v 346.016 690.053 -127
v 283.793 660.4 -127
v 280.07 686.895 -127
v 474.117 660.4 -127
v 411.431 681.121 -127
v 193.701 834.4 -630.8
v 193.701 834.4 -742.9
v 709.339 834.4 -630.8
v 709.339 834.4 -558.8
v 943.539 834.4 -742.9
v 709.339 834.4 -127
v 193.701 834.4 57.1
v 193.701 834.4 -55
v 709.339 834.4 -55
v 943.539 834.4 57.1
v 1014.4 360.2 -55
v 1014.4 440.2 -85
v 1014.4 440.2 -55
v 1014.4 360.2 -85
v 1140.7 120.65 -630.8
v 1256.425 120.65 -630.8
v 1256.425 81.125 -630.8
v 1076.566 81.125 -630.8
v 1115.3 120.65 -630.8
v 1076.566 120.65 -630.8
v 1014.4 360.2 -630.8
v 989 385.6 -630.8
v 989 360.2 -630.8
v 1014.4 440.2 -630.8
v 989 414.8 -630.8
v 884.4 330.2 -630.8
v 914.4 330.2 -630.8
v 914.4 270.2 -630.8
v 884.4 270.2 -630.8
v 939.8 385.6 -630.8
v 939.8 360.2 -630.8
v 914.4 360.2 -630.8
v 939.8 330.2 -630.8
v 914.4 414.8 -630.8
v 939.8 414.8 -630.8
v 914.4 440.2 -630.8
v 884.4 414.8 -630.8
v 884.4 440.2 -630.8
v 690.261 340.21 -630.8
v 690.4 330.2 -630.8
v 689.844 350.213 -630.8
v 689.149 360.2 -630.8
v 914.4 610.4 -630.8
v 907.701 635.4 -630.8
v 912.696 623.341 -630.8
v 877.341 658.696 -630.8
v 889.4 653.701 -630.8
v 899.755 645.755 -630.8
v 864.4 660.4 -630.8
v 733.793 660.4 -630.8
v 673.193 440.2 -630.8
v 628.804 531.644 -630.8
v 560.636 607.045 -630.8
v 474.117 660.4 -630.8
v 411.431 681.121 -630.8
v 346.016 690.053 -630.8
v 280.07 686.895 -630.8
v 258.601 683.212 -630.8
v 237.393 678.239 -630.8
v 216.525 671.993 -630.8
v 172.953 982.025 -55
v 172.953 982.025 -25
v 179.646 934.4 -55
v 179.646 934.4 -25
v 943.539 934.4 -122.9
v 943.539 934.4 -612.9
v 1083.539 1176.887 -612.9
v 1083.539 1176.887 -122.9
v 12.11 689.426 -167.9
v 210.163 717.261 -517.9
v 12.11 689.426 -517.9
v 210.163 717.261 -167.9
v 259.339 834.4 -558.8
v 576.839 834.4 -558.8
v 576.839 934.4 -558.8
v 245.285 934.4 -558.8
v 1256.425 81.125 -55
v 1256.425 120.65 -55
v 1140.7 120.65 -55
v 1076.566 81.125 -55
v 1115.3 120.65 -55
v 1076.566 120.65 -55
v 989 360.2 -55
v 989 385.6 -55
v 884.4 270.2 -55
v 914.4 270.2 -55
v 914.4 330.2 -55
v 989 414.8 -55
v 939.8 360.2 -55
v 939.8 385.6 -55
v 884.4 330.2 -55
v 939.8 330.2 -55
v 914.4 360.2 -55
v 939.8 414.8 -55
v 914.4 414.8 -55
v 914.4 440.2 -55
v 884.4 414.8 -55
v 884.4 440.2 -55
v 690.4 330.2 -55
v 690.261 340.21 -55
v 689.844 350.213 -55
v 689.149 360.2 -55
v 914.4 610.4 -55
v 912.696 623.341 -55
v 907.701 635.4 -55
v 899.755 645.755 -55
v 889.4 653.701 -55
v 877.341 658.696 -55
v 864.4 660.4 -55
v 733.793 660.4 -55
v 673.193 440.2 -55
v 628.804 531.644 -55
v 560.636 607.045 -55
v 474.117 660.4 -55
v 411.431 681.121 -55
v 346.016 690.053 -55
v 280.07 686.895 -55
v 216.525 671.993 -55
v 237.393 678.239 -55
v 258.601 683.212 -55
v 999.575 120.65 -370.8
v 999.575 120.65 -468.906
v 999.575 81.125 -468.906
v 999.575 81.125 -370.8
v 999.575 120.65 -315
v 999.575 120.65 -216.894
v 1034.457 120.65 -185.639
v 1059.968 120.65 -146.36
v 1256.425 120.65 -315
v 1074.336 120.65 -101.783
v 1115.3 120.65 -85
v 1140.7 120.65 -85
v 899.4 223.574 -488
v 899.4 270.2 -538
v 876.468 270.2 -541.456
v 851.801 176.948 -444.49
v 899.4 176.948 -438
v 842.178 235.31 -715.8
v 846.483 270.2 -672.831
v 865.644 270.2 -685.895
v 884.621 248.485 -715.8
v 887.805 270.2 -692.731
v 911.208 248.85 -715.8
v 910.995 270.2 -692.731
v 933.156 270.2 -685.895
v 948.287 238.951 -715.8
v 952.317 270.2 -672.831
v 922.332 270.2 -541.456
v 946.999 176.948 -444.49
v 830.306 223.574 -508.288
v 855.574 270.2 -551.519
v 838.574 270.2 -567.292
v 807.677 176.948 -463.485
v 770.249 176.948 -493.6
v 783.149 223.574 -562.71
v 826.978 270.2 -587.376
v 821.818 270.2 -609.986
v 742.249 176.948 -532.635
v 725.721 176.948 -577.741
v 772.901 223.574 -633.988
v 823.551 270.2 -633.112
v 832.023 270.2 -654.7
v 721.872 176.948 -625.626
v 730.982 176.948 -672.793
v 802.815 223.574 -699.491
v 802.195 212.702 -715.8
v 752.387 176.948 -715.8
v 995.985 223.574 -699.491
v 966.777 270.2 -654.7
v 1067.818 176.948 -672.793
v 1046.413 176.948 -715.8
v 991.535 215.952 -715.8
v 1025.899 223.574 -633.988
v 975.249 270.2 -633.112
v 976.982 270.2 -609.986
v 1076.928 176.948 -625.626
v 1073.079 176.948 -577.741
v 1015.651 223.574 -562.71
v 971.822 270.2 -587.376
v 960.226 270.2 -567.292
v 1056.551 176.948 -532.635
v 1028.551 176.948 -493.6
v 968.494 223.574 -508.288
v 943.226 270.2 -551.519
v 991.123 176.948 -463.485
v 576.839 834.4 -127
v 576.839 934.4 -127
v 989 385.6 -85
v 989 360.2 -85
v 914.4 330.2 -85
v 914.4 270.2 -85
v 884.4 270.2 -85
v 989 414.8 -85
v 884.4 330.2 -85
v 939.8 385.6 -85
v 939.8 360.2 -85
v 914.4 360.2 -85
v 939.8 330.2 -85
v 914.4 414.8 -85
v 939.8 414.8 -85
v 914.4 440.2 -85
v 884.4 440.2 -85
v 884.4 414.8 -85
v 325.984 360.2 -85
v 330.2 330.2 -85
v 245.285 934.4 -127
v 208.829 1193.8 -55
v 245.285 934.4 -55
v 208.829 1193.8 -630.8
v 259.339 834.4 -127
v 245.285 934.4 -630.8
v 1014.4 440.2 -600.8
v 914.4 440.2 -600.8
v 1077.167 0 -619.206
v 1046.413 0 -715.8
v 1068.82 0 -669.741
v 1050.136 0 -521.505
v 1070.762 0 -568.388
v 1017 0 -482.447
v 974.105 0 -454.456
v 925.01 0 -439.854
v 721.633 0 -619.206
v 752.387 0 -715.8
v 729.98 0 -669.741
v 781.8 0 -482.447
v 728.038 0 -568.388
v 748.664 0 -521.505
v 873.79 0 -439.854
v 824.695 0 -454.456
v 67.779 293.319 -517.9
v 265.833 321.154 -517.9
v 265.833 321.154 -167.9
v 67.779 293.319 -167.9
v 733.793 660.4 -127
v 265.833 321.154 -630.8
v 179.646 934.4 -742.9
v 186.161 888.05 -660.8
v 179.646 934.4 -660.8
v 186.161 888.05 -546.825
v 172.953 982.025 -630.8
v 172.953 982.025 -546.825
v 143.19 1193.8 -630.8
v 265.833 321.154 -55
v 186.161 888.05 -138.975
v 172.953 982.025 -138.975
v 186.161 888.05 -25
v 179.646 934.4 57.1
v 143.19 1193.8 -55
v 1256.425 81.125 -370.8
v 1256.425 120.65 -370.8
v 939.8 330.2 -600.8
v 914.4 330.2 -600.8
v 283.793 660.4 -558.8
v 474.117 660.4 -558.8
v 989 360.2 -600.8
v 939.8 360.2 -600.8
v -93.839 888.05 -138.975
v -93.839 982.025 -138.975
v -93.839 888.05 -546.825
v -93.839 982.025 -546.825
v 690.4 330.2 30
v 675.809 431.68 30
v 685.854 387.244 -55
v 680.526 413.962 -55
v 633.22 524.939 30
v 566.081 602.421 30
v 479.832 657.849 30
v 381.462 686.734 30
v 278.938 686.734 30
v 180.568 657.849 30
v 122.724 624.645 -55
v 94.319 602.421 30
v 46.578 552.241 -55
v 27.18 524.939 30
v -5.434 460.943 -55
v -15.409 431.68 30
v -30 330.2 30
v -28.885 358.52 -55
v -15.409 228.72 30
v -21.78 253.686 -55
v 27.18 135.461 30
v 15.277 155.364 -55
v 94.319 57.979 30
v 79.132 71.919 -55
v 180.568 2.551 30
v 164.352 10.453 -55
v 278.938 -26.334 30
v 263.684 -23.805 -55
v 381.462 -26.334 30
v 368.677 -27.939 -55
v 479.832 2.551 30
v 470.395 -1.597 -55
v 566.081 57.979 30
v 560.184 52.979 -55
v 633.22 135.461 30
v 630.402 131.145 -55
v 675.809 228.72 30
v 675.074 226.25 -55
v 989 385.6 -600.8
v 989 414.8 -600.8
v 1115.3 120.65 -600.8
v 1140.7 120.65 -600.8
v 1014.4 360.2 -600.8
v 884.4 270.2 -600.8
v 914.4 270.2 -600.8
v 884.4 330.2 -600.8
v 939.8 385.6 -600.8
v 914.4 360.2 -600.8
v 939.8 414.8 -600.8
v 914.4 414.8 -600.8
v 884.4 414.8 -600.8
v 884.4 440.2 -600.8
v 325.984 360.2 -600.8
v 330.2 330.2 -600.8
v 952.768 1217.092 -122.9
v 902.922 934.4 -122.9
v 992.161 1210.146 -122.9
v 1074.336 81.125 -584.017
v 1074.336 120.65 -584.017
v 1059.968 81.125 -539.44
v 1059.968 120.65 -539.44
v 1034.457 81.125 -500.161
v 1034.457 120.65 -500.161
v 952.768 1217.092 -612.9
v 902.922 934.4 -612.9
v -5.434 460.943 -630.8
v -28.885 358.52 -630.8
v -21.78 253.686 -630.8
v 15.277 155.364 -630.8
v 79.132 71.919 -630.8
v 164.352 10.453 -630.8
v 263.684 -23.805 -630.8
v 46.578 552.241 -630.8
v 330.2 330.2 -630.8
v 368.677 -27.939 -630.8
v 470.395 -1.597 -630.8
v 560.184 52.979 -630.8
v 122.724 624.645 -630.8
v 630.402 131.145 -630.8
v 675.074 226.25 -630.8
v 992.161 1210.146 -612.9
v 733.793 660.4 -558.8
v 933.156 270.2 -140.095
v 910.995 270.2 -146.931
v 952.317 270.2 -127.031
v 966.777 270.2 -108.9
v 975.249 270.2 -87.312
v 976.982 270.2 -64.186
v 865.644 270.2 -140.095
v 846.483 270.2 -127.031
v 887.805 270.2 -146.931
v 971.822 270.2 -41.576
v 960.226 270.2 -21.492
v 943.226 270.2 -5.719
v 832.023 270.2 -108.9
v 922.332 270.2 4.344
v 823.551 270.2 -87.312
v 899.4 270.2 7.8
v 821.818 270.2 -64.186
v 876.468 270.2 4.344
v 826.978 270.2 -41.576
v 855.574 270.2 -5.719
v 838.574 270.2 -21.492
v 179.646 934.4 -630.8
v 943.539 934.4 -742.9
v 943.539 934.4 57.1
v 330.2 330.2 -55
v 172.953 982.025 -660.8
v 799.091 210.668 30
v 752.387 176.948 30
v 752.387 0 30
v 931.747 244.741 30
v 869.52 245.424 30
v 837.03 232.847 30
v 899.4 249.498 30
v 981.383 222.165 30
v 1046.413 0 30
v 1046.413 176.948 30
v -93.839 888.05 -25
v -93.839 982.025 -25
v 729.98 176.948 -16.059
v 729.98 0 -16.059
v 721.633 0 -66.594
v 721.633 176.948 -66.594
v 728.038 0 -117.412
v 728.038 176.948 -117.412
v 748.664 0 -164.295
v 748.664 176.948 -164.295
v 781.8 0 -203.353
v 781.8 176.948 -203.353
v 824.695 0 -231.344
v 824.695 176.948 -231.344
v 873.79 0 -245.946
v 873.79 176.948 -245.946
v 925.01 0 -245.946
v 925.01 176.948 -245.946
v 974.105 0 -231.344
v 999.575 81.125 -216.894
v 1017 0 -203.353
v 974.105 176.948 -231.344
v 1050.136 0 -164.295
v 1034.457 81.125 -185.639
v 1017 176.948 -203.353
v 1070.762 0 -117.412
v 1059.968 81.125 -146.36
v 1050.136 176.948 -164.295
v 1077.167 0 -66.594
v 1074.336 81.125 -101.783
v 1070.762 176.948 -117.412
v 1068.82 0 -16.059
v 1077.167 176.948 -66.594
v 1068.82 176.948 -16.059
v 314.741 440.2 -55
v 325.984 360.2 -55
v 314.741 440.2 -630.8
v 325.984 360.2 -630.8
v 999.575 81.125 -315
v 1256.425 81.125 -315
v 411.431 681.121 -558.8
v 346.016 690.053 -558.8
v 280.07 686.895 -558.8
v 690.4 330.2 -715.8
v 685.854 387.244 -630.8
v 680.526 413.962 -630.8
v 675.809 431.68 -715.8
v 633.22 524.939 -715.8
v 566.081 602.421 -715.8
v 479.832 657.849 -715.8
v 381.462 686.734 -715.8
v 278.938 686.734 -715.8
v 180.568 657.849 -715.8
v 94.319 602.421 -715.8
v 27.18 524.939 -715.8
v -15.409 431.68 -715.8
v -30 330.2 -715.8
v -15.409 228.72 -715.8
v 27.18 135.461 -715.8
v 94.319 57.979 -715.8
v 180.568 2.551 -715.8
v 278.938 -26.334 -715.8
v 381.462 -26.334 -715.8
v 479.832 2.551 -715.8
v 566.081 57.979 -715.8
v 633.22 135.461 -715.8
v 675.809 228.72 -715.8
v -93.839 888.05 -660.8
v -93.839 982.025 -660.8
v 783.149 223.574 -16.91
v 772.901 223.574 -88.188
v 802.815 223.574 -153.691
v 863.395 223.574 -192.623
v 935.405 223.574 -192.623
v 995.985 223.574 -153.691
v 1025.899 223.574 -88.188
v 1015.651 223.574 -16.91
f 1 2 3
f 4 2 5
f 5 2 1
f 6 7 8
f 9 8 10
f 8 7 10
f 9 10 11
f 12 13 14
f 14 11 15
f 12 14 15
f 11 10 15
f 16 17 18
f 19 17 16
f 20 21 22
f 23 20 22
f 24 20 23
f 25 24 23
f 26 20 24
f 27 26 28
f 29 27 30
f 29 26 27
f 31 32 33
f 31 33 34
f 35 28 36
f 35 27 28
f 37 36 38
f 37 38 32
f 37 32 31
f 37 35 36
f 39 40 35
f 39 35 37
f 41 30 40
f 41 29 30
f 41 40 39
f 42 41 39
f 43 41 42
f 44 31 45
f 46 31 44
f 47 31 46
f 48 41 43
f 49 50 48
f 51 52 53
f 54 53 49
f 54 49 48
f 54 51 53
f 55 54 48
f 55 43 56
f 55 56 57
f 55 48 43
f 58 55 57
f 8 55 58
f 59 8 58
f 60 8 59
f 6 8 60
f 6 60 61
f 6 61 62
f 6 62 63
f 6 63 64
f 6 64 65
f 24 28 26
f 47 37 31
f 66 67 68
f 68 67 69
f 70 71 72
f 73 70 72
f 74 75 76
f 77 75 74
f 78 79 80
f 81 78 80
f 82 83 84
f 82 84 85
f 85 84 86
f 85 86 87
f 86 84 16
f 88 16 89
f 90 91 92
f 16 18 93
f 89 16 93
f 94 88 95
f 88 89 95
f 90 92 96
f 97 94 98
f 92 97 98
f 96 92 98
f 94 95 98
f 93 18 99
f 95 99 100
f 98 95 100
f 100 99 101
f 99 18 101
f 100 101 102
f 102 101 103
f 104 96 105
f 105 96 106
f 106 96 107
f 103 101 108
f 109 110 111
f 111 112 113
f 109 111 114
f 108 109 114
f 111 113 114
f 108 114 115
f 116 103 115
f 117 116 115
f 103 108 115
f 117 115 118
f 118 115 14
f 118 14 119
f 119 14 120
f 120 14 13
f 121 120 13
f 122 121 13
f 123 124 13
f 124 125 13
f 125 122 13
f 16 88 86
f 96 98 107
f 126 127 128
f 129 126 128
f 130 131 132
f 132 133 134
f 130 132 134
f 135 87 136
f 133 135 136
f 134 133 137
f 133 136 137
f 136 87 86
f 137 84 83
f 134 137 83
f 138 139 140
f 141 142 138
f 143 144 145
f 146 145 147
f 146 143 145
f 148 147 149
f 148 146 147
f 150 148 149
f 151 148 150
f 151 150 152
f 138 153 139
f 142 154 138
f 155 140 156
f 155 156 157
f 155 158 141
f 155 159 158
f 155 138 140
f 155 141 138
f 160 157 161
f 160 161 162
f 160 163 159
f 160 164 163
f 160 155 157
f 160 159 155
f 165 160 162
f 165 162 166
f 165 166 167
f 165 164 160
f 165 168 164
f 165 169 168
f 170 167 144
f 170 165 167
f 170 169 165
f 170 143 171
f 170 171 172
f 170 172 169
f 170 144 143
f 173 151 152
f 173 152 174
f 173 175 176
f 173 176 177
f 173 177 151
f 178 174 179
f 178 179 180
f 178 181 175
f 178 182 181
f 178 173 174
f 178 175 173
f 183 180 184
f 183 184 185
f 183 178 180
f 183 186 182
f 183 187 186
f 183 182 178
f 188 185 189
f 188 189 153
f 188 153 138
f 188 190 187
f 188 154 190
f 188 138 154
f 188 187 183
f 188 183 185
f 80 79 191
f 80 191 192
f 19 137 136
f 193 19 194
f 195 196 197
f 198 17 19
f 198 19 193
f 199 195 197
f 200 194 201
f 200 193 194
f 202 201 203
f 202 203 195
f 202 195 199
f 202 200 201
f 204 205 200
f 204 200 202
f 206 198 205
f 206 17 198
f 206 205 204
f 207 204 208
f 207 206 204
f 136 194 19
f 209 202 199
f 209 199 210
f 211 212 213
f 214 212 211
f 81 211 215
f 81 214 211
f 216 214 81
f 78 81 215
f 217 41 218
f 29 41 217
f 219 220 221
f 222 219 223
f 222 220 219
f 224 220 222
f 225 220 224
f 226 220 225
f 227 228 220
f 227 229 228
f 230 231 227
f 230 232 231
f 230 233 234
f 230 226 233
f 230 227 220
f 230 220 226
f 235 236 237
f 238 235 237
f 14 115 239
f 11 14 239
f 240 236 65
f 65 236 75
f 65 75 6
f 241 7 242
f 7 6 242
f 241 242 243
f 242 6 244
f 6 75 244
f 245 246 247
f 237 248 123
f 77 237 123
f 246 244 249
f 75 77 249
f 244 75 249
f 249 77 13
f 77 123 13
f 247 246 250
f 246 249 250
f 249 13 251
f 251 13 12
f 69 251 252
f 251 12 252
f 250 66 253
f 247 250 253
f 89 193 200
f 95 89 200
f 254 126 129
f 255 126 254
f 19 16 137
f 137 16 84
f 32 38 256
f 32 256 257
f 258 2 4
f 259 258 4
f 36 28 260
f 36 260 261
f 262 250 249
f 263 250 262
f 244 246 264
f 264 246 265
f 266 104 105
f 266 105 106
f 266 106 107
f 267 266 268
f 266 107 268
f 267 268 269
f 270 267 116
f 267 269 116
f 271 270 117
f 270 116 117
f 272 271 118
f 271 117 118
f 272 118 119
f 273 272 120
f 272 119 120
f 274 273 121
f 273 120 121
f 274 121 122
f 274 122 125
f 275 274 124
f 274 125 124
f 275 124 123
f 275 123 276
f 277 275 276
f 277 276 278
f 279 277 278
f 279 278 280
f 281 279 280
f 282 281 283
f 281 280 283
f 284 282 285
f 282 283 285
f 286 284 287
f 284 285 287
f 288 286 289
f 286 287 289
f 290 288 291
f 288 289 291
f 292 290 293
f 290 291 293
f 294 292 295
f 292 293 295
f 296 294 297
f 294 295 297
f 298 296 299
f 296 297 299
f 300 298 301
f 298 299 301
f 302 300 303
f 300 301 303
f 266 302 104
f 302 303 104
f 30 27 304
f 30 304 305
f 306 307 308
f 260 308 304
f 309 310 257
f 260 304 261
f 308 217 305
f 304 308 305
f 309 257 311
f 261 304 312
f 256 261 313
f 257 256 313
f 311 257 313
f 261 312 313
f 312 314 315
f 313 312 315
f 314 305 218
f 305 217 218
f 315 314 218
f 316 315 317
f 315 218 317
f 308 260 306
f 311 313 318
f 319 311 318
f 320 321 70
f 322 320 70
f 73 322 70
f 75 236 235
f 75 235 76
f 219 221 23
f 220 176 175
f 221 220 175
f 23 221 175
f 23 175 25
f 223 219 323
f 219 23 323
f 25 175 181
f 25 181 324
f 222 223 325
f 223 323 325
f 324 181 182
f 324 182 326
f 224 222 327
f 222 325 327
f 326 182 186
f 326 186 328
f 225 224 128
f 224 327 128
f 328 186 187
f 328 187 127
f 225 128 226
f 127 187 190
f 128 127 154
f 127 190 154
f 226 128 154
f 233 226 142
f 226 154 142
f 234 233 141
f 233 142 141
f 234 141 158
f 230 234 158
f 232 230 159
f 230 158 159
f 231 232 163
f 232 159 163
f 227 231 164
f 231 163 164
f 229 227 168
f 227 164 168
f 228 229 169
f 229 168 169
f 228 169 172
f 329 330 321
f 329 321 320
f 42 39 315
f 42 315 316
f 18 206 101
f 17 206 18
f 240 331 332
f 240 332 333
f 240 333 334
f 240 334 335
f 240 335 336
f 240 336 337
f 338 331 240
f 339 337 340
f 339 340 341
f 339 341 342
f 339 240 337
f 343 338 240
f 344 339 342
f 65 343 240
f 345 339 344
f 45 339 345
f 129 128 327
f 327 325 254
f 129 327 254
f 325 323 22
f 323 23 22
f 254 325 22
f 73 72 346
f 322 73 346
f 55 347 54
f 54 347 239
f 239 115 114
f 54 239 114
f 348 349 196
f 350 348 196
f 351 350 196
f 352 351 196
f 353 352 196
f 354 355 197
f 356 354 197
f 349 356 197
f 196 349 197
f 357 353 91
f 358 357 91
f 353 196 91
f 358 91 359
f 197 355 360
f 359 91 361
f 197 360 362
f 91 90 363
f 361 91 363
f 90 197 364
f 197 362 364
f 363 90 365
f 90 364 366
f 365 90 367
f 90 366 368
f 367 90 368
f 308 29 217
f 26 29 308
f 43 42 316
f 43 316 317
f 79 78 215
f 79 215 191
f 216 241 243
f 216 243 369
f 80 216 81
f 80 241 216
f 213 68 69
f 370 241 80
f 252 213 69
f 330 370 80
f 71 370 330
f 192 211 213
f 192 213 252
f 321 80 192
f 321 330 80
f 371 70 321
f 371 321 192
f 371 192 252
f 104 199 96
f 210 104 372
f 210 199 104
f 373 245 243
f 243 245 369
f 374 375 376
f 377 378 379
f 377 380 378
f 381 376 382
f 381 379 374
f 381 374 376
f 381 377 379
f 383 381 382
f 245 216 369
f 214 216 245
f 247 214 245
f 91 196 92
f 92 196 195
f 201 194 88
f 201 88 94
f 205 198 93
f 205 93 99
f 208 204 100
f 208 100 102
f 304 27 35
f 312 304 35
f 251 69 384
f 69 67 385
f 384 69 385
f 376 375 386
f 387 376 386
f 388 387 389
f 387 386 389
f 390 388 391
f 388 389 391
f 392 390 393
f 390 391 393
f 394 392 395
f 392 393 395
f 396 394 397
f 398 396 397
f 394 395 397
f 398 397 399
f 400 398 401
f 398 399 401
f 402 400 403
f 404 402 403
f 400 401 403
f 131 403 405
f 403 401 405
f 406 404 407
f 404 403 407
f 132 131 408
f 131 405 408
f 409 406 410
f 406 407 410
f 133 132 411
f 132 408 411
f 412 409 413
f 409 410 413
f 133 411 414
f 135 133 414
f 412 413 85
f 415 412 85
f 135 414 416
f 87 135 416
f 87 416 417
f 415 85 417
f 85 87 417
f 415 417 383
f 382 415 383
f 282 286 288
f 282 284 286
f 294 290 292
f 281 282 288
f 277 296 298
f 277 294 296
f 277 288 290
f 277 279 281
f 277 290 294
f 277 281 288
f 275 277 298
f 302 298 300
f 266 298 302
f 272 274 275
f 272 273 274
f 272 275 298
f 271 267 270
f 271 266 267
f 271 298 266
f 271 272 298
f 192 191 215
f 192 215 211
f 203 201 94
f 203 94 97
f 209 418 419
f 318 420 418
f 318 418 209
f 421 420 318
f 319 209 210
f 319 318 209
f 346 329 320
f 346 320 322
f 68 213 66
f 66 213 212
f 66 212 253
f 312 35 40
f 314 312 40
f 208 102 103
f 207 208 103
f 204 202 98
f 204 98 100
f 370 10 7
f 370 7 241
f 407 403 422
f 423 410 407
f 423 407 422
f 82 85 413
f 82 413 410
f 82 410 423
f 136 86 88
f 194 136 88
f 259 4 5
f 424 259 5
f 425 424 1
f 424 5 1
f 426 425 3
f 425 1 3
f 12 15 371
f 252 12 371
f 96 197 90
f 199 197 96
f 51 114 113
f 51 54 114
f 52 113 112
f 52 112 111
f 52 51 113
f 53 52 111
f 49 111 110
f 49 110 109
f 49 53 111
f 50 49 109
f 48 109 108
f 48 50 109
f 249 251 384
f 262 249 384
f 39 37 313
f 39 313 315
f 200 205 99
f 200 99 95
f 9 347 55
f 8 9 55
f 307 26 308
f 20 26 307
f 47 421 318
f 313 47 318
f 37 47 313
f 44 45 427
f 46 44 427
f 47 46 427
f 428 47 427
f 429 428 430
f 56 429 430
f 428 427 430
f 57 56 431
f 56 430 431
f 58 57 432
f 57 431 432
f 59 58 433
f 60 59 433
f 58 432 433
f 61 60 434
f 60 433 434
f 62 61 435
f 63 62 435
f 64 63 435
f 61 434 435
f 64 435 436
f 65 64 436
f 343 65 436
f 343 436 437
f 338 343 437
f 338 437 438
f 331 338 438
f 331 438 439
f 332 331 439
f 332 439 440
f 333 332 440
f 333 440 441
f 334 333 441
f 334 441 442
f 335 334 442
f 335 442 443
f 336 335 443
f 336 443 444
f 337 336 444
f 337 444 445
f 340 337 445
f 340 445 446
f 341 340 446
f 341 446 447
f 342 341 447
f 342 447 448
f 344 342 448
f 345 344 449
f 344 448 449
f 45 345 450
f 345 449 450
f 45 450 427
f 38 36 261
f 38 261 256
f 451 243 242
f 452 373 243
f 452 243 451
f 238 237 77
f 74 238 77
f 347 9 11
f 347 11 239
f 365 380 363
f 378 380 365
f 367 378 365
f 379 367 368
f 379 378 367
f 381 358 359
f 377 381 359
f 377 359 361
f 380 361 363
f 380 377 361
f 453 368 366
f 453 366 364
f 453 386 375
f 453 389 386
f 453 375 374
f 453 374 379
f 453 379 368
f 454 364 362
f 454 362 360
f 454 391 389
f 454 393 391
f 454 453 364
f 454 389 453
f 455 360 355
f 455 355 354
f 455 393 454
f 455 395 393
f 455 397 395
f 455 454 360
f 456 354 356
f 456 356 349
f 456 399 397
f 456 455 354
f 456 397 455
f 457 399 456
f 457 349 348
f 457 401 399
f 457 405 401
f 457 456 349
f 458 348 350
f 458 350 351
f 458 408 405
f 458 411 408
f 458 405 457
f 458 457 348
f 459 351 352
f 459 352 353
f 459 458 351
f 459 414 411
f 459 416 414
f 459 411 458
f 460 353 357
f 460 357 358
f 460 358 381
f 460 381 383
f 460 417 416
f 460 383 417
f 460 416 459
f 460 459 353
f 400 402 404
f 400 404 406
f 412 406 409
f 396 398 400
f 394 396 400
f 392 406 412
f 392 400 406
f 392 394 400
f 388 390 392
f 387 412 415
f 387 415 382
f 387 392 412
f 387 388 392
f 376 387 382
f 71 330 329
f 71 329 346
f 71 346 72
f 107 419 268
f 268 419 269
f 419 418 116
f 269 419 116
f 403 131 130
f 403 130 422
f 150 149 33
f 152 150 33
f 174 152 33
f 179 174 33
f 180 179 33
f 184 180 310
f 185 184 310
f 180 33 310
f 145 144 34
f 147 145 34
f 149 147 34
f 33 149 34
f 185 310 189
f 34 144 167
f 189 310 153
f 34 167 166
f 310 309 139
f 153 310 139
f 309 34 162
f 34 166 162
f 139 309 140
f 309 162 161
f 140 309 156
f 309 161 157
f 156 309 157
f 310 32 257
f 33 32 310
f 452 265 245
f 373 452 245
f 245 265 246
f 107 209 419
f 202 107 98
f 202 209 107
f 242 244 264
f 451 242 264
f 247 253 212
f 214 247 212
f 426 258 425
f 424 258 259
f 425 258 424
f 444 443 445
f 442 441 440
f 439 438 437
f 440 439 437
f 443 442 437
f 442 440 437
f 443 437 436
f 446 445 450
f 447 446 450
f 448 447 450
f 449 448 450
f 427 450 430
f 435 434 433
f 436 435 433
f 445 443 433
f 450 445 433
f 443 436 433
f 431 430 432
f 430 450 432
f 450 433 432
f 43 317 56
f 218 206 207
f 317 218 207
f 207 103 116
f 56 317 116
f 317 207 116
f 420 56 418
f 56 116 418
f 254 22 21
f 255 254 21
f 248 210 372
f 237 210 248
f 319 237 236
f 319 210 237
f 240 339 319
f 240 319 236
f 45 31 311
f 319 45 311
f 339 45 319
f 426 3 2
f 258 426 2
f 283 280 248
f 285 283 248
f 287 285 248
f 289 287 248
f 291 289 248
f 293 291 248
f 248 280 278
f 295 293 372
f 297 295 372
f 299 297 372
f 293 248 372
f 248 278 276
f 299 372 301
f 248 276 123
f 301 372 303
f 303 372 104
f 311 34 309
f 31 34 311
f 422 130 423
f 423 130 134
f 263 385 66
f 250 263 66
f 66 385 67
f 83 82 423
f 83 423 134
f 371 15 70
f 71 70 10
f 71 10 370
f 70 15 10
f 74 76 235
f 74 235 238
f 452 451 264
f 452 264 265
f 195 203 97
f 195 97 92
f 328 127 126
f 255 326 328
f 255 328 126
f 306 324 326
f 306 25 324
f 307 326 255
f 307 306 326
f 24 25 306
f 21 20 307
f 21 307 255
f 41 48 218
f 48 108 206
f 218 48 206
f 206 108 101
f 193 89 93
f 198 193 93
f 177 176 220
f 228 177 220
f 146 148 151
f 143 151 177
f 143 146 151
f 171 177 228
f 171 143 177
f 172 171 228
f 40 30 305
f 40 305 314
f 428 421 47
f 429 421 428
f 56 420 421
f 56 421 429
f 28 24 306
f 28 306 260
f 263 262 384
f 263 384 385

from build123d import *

# Parameters (mm, degrees)
BOSS_EXTRUDE1_DEPTH       = 30
BOSS_EXTRUDE1_DEPTH_BACK  = 55
SKETCH1_R                 = 360.2
BOSS_EXTRUDE2_DEPTH       = 55
BOSS_EXTRUDE2_DEPTH_BACK  = 30
SKETCH2_R                 = 360.2
BOSS_EXTRUDE3_DEPTH       = 10
BOSS_EXTRUDE6_DEPTH       = 575.8
BOSS_EXTRUDE33_DEPTH      = 400
BOSS_EXTRUDE33_DEPTH_BACK = 400
SKETCH25_W                = 366.7
SKETCH25_H                = 100
SKETCH5_W                 = 450
SKETCH5_H                 = 72
BOSS_EXTRUDE7_DEPTH       = 367.981167426
SKETCH8_W                 = 49.2
SKETCH8_H                 = 29.2
BOSS_EXTRUDE13_DEPTH      = 30
SKETCH19_R                = 177.8
BOSS_EXTRUDE22_DEPTH      = 270.2
CHAMFER1_SIZE             = 100
CHAMFER1_SIZE2            = 93.251508614
BOSS_EXTRUDE27_DEPTH      = 30
BOSS_EXTRUDE20_DEPTH      = 260
BOSS_EXTRUDE28_START      = 30
SKETCH23_W                = 30
SKETCH23_H                = 60
SKETCH23_W_2              = 49.2
SKETCH23_H_2              = 25.4
SKETCH23_W_3              = 25.4
BOSS_EXTRUDE28_DEPTH      = 30
SKETCH24_R                = 177.8
BOSS_EXTRUDE29_DEPTH      = 270.2
CHAMFER2_SIZE             = 100
CHAMFER2_SIZE2            = 93.251508614
BOSS_EXTRUDE30_DEPTH      = 30
BOSS_EXTRUDE31_DEPTH      = 260
BOSS_EXTRUDE18_START      = -83.975
BOSS_EXTRUDE18_DEPTH      = 113.975
BOSS_EXTRUDE19_START      = -30
BOSS_EXTRUDE19_DEPTH      = 113.975
BOSS_EXTRUDE32_START      = -575.8
BOSS_EXTRUDE32_DEPTH      = 575.8
BOSS_EXTRUDE34_REACH      = 1588.441
SKETCH26_W                = 184.1
SKETCH26_H                = 100
SKETCH27_W                = 350
SKETCH27_H                = 400
BOSS_EXTRUDE35_DEPTH      = 200
BOSS_EXTRUDE36_START      = -130
BOSS_EXTRUDE36_DEPTH      = 490
FILLET3_R                 = 50
SKETCH30_W                = 2623.123535912
SKETCH30_H                = 2420.43733062
CUT_EXTRUDE1_DEPTH        = 1934.451296391
SKETCH31_W                = 2584.765961417
SKETCH31_H                = 1858.147621016
CUT_EXTRUDE2_DEPTH        = 1913.404602985


# Read off the part's stored shape, not the designer's step: Boss-Extrude18, Boss-Extrude19, Boss-Extrude32
with BuildPart() as part:
    # Sketch1 → Boss-Extrude1 (new, two sides: drawn at the far end of the back side and taken through both)
    with BuildSketch(Plane.XY.offset(-BOSS_EXTRUDE1_DEPTH_BACK)):
        with Locations((330.2, 330.2)):
            Circle(SKETCH1_R)
    extrude(amount=BOSS_EXTRUDE1_DEPTH + BOSS_EXTRUDE1_DEPTH_BACK)



with BuildPart() as body_2:
    # Sketch2 → Boss-Extrude2 (new, two sides: drawn at the far end of the back side and taken through both)
    with BuildSketch(Plane.XY.offset(-685.8).offset(-BOSS_EXTRUDE2_DEPTH_BACK)):
        with Locations((330.2, 330.2)):
            Circle(SKETCH2_R)
    extrude(amount=BOSS_EXTRUDE2_DEPTH + BOSS_EXTRUDE2_DEPTH_BACK)


with BuildPart() as part_1:
    add(part.part)

    add(body_2.part)  # Boss-Extrude3 merges body 2
    # 3DSketch2 → Boss-Extrude3 (add)
    with BuildSketch(Plane(origin=(330.2, 460, -630.8), x_dir=(0.5893057409504111, 0, 0.807910108664873), z_dir=(0, -1, 0))):
        Polygon((465.194640569, 339.322245639), (0, 0), (247.508411199, -339.322245639), (712.703051768, 0), align=None)
        Polygon((-38.304873162, 52.514157063), (0, 0), (465.194640569, 339.322245639), (426.889767407, 391.836402702), align=None)
    extrude(amount=-BOSS_EXTRUDE3_DEPTH)

    # Sketch4 → Boss-Extrude6 (add)
    with BuildSketch(Plane(origin=(0, -170.8, -630.8), x_dir=(1, 0, 0), z_dir=(0, 0, 1))):
        Polygon((208.828935151, 1364.6), (330.2, 501), (265.832575532, 491.953748438), (143.190142937, 1364.6), align=None)
    extrude(amount=BOSS_EXTRUDE6_DEPTH)

    # Sketch5 → Boss-Extrude7 (add, along a direction that is not the sketch's normal)
    with BuildSketch(Plane(origin=(0, 470, 0), x_dir=(1, 0, 0), z_dir=(0, 1, 0))):
        with Locations((535.552391309, 91)):
            Rectangle(SKETCH5_W, SKETCH5_H)
        with Locations((535.552391309, 594.8)):
            Rectangle(SKETCH5_W, SKETCH5_H)
    extrude(amount=BOSS_EXTRUDE7_DEPTH, dir=(-0.13917310096006222, 0.9902680687415708, 0))

    # Sketch8 → Boss-Extrude13 (add)
    with BuildSketch(Plane(origin=(0, 0, -630.8), x_dir=(-1, 0, 0), z_dir=(0, 0, -1))):
        Polygon((-1014.4, 360.2), (-939.8, 360.2), (-939.8, 330.2), (-914.4, 330.2), (-914.4, 270.2), (-884.4, 270.2), (-884.4, 330.2), (-330.2, 330.2), (-325.983774959, 360.2), (-914.4, 360.2), (-914.4, 414.8), (-884.4, 414.8), (-884.4, 440.2), (-1014.4, 440.2), align=None)
        with Locations((-964.4, 400.2)):
            Rectangle(SKETCH8_W, SKETCH8_H, mode=Mode.SUBTRACT)
    extrude(amount=-BOSS_EXTRUDE13_DEPTH)

    # Sketch19 → Boss-Extrude22 (add)
    with BuildSketch(Plane.XZ.offset(-270.2)):
        with Locations(Location((899.4, -615.8, 0), (0, 0, 90))):
            Circle(SKETCH19_R)
    extrude(amount=BOSS_EXTRUDE22_DEPTH)

    # Chamfer1
    chamfer1_edges = [part_1.edges().sort_by_distance(p)[0] for p in [
        (899.4, 270.2, -793.6),
    ]]
    chamfer1_side = [part_1.faces().sort_by_distance(p)[0] for p in [
        (899.4, 270.2, -788.571056572),
    ]]
    chamfer(chamfer1_edges, length=CHAMFER1_SIZE, length2=CHAMFER1_SIZE2, reference=chamfer1_side[0])

    # Sketch8<7> → Boss-Extrude27 (add)
    with BuildSketch(Plane(origin=(0, 0, -630.8), x_dir=(-1, 0, 0), z_dir=(0, 0, -1))):
        Polygon((-1014.4, 360.2), (-1140.7, 120.65), (-1115.3, 120.65), (-989, 360.2), align=None)
    extrude(amount=-BOSS_EXTRUDE27_DEPTH)

    # Sketch8<4> → Boss-Extrude20 (add)
    with BuildSketch(Plane(origin=(0, 0, -630.8), x_dir=(-1, 0, 0), z_dir=(0, 0, -1))):
        Polygon((-1256.425, 81.125), (-1256.425, 120.65), (-1140.7, 120.65), (-1115.3, 120.65), (-999.575, 120.65), (-999.575, 81.125), align=None)
    extrude(amount=-BOSS_EXTRUDE20_DEPTH)

    # Sketch23 → Boss-Extrude28 (add)
    with BuildSketch(Plane(origin=(0, 0, -55), x_dir=(-1, 0, 0), z_dir=(0, 0, -1)).offset(BOSS_EXTRUDE28_START)):
        with BuildLine():
            Line((-330.2, 360.2), (-689.148519986, 360.2))
            ThreePointArc((-689.148519986, 360.2), (-690.086993999, 345.213046012), (-690.4, 330.2))
            Line((-690.4, 330.2), (-330.2, 330.2))
            Line((-330.2, 330.2), (-330.2, 360.2))
        make_face()
        with BuildLine():
            Line((-914.4, 360.2), (-939.8, 360.2))
            Line((-939.8, 360.2), (-939.8, 330.2))
            Line((-939.8, 330.2), (-914.4, 330.2))
            Line((-914.4, 330.2), (-884.4, 330.2))
            Line((-884.4, 330.2), (-690.4, 330.2))
            ThreePointArc((-690.4, 330.2), (-690.086993999, 345.213046012), (-689.148519986, 360.2))
            Line((-689.148519986, 360.2), (-914.4, 360.2))
        make_face()
        with Locations((-899.4, 300.2)):
            Rectangle(SKETCH23_W, SKETCH23_H)
        Polygon((-939.8, 385.6), (-939.8, 360.2), (-914.4, 360.2), (-914.4, 414.8), (-914.4, 440.2), (-939.8, 440.2), (-939.8, 414.8), align=None)
        with Locations((-964.4, 372.9)):
            Rectangle(SKETCH23_W_2, SKETCH23_H_2)
        with Locations((-964.4, 427.5)):
            Rectangle(SKETCH23_W_2, SKETCH23_H_2)
        Polygon((-1014.4, 440.2), (-1014.4, 385.6), (-989, 385.6), (-989, 414.8), (-989, 440.2), align=None)
        with Locations((-1001.7, 372.9)):
            Rectangle(SKETCH23_W_3, SKETCH23_H_2)
        Polygon((-325.983774959, 360.2), (-330.2, 360.2), (-330.2, 330.2), align=None)
        with Locations((-899.4, 427.5)):
            Rectangle(SKETCH23_W, SKETCH23_H_2)
    extrude(amount=-BOSS_EXTRUDE28_DEPTH)

    # Sketch24 → Boss-Extrude29 (add)
    with BuildSketch(Plane(origin=(0, 270.2, 0), x_dir=(-1, 0, 0), z_dir=(0, -1, 0))):
        with Locations(Location((-899.4, 70, 0), (0, 0, 270))):
            Circle(SKETCH24_R)
    extrude(amount=BOSS_EXTRUDE29_DEPTH)

    # Chamfer2
    chamfer2_edges = [part_1.edges().sort_by_distance(p)[0] for p in [
        (899.4, 270.2, -247.8),
    ]]
    chamfer2_side = [part_1.faces().sort_by_distance(p)[0] for p in [
        (899.4, 270.2, -242.771056572),
    ]]
    chamfer(chamfer2_edges, length=CHAMFER2_SIZE, length2=CHAMFER2_SIZE2, reference=chamfer2_side[0])

    # Sketch23<10> → Boss-Extrude30 (add)
    with BuildSketch(Plane(origin=(0, 0, -55), x_dir=(-1, 0, 0), z_dir=(0, 0, -1))):
        Polygon((-1014.4, 360.2), (-1140.7, 120.65), (-1115.3, 120.65), (-989, 360.2), align=None)
    extrude(amount=BOSS_EXTRUDE30_DEPTH)

    # Sketch23<12> → Boss-Extrude31 (add)
    with BuildSketch(Plane(origin=(0, 0, -55), x_dir=(-1, 0, 0), z_dir=(0, 0, -1))):
        Polygon((-1256.425, 81.125), (-1256.425, 120.65), (-1140.7, 120.65), (-1115.3, 120.65), (-999.575, 120.65), (-999.575, 81.125), align=None)
    extrude(amount=BOSS_EXTRUDE31_DEPTH)

    # Boss-Extrude18 outline → Boss-Extrude18 (add)
    with BuildSketch(Plane(origin=(0, 0, -630.8), x_dir=(-1, 0, 0), z_dir=(0, 0, -1)).offset(BOSS_EXTRUDE18_START)):
        Polygon((93.839496852, 982.025), (-172.953178206, 982.025), (-186.160503148, 888.05), (93.839496852, 888.05), align=None)
    extrude(amount=BOSS_EXTRUDE18_DEPTH)

    # Boss-Extrude19 outline → Boss-Extrude19 (add)
    with BuildSketch(Plane(origin=(0, 0, -55), x_dir=(-1, 0, 0), z_dir=(0, 0, -1)).offset(BOSS_EXTRUDE19_START)):
        Polygon((93.839496852, 982.025), (-172.953178206, 982.025), (-186.160503148, 888.05), (93.839496852, 888.05), align=None)
    extrude(amount=BOSS_EXTRUDE19_DEPTH)

    # Boss-Extrude32 outline → Boss-Extrude32 (add)
    with BuildSketch(Plane(origin=(0, 0, -630.8), x_dir=(-1, 0, 0), z_dir=(0, 0, -1)).offset(BOSS_EXTRUDE32_START)):
        with BuildLine():
            Line((-750.2, 460), (-750.2, 470))
            Line((-750.2, 470), (-310.552391309, 470))
            Line((-310.552391309, 470), (-283.793416382, 660.4))
            Line((-283.793416382, 660.4), (-474.11664254, 660.4))
            ThreePointArc((-474.11664254, 660.4), (-378.928501989, 687.088740497), (-280.069849034, 686.894558361))
            Line((-280.069849034, 686.894558361), (-259.339311143, 834.4))
            Line((-259.339311143, 834.4), (-709.339311143, 834.4))
            Line((-709.339311143, 834.4), (-733.793416381, 660.4))
            Line((-733.793416381, 660.4), (-914.4, 660.4))
            Line((-914.4, 660.4), (-914.4, 440.2))
            Line((-914.4, 440.2), (-314.740508183, 440.2))
            Line((-314.740508183, 440.2), (-311.957799656, 460))
            Line((-311.957799656, 460), (-750.2, 460))
        make_face()
    extrude(amount=BOSS_EXTRUDE32_DEPTH)



with BuildPart() as body_2_2:
    # Sketch25 → Boss-Extrude33 (new, two sides: drawn at the far end of the back side and taken through both)
    with BuildSketch(Plane.XY.offset(-342.9).offset(-BOSS_EXTRUDE33_DEPTH_BACK)):
        with Locations((760.189311143, 884.4)):
            Rectangle(SKETCH25_W, SKETCH25_H)
    extrude(amount=BOSS_EXTRUDE33_DEPTH + BOSS_EXTRUDE33_DEPTH_BACK)


with BuildPart() as part_2:
    add(part_1.part)

    add(body_2_2.part)  # Boss-Extrude34 merges body 2 2
    # Boss-Extrude34: up to this plane
    boss_extrude34_end = Plane(origin=(143.190142937, 1193.8, 837.459616456), z_dir=(0.9902680687415708, 0.1391731009600622, 0))
    # Sketch26 → Boss-Extrude34 (add, up to the surface)
    with BuildSketch(Plane.ZY.offset(-576.839311143), mode=Mode.PRIVATE) as boss_extrude34_sk1:
        with Locations((-34.95, 884.4)):
            Rectangle(SKETCH26_W, SKETCH26_H)
    boss_extrude34_tool1 = split(extrude(boss_extrude34_sk1.sketch, amount=BOSS_EXTRUDE34_REACH, mode=Mode.PRIVATE), bisect_by=boss_extrude34_end, keep=Keep.BOTH, mode=Mode.PRIVATE)
    add(boss_extrude34_tool1.solids().sort_by_distance((576.839311, 884.4, -34.95))[0])
    # Sketch26 → Boss-Extrude34 (add, up to the surface)
    with BuildSketch(Plane.ZY.offset(-576.839311143), mode=Mode.PRIVATE) as boss_extrude34_sk2:
        with Locations((-650.85, 884.4)):
            Rectangle(SKETCH26_W, SKETCH26_H)
    boss_extrude34_tool2 = split(extrude(boss_extrude34_sk2.sketch, amount=BOSS_EXTRUDE34_REACH, mode=Mode.PRIVATE), bisect_by=boss_extrude34_end, keep=Keep.BOTH, mode=Mode.PRIVATE)
    add(boss_extrude34_tool2.solids().sort_by_distance((576.839311, 884.4, -650.85))[0])

    # Sketch27 → Boss-Extrude35 (add)
    with BuildSketch(Plane(origin=(304.944608977, 42.857169884, 0), x_dir=(0, 0, 1), z_dir=(-0.9902680687415708, -0.13917310096006216, 0))):
        with Locations((-342.9, 481.031558361)):
            Rectangle(SKETCH27_W, SKETCH27_H)
    extrude(amount=BOSS_EXTRUDE35_DEPTH)

    # Sketch29 → Boss-Extrude36 (add)
    with BuildSketch(Plane(origin=(0, 0, -742.9), x_dir=(-1, 0, 0), z_dir=(0, 0, -1)).offset(BOSS_EXTRUDE36_START)):
        Polygon((-1083.539311143, 1176.88711306), (-992.16080089, 1210.146170843), (-943.539311143, 934.4), align=None)
        Polygon((-992.16080089, 1210.146170843), (-943.539311143, 934.4), (-902.922246668, 934.4), (-952.768490769, 1217.09209795), align=None)
    extrude(amount=-BOSS_EXTRUDE36_DEPTH)

    # Fillet3
    fillet3_edges = [part_2.edges().sort_by_distance(p)[0] for p in [
        (914.4, 660.4, -342.9),
    ]]
    fillet(fillet3_edges, radius=FILLET3_R)

    # Sketch30 → Cut-Extrude1 (cut, through all)
    with BuildSketch(Plane.XY.offset(30)):
        with Locations((451.826678709, -519.81866531)):
            Rectangle(SKETCH30_W, SKETCH30_H)
    extrude(amount=CUT_EXTRUDE1_DEPTH, mode=Mode.SUBTRACT)

    # Sketch31 → Cut-Extrude2 (cut, through all)
    with BuildSketch(Plane(origin=(0, 0, -715.8), x_dir=(-1, 0, 0), z_dir=(0, 0, -1))):
        with Locations((-741.050727566, -238.673810508)):
            Rectangle(SKETCH31_W, SKETCH31_H)
    extrude(amount=CUT_EXTRUDE2_DEPTH, mode=Mode.SUBTRACT)


solid = part_2.part
